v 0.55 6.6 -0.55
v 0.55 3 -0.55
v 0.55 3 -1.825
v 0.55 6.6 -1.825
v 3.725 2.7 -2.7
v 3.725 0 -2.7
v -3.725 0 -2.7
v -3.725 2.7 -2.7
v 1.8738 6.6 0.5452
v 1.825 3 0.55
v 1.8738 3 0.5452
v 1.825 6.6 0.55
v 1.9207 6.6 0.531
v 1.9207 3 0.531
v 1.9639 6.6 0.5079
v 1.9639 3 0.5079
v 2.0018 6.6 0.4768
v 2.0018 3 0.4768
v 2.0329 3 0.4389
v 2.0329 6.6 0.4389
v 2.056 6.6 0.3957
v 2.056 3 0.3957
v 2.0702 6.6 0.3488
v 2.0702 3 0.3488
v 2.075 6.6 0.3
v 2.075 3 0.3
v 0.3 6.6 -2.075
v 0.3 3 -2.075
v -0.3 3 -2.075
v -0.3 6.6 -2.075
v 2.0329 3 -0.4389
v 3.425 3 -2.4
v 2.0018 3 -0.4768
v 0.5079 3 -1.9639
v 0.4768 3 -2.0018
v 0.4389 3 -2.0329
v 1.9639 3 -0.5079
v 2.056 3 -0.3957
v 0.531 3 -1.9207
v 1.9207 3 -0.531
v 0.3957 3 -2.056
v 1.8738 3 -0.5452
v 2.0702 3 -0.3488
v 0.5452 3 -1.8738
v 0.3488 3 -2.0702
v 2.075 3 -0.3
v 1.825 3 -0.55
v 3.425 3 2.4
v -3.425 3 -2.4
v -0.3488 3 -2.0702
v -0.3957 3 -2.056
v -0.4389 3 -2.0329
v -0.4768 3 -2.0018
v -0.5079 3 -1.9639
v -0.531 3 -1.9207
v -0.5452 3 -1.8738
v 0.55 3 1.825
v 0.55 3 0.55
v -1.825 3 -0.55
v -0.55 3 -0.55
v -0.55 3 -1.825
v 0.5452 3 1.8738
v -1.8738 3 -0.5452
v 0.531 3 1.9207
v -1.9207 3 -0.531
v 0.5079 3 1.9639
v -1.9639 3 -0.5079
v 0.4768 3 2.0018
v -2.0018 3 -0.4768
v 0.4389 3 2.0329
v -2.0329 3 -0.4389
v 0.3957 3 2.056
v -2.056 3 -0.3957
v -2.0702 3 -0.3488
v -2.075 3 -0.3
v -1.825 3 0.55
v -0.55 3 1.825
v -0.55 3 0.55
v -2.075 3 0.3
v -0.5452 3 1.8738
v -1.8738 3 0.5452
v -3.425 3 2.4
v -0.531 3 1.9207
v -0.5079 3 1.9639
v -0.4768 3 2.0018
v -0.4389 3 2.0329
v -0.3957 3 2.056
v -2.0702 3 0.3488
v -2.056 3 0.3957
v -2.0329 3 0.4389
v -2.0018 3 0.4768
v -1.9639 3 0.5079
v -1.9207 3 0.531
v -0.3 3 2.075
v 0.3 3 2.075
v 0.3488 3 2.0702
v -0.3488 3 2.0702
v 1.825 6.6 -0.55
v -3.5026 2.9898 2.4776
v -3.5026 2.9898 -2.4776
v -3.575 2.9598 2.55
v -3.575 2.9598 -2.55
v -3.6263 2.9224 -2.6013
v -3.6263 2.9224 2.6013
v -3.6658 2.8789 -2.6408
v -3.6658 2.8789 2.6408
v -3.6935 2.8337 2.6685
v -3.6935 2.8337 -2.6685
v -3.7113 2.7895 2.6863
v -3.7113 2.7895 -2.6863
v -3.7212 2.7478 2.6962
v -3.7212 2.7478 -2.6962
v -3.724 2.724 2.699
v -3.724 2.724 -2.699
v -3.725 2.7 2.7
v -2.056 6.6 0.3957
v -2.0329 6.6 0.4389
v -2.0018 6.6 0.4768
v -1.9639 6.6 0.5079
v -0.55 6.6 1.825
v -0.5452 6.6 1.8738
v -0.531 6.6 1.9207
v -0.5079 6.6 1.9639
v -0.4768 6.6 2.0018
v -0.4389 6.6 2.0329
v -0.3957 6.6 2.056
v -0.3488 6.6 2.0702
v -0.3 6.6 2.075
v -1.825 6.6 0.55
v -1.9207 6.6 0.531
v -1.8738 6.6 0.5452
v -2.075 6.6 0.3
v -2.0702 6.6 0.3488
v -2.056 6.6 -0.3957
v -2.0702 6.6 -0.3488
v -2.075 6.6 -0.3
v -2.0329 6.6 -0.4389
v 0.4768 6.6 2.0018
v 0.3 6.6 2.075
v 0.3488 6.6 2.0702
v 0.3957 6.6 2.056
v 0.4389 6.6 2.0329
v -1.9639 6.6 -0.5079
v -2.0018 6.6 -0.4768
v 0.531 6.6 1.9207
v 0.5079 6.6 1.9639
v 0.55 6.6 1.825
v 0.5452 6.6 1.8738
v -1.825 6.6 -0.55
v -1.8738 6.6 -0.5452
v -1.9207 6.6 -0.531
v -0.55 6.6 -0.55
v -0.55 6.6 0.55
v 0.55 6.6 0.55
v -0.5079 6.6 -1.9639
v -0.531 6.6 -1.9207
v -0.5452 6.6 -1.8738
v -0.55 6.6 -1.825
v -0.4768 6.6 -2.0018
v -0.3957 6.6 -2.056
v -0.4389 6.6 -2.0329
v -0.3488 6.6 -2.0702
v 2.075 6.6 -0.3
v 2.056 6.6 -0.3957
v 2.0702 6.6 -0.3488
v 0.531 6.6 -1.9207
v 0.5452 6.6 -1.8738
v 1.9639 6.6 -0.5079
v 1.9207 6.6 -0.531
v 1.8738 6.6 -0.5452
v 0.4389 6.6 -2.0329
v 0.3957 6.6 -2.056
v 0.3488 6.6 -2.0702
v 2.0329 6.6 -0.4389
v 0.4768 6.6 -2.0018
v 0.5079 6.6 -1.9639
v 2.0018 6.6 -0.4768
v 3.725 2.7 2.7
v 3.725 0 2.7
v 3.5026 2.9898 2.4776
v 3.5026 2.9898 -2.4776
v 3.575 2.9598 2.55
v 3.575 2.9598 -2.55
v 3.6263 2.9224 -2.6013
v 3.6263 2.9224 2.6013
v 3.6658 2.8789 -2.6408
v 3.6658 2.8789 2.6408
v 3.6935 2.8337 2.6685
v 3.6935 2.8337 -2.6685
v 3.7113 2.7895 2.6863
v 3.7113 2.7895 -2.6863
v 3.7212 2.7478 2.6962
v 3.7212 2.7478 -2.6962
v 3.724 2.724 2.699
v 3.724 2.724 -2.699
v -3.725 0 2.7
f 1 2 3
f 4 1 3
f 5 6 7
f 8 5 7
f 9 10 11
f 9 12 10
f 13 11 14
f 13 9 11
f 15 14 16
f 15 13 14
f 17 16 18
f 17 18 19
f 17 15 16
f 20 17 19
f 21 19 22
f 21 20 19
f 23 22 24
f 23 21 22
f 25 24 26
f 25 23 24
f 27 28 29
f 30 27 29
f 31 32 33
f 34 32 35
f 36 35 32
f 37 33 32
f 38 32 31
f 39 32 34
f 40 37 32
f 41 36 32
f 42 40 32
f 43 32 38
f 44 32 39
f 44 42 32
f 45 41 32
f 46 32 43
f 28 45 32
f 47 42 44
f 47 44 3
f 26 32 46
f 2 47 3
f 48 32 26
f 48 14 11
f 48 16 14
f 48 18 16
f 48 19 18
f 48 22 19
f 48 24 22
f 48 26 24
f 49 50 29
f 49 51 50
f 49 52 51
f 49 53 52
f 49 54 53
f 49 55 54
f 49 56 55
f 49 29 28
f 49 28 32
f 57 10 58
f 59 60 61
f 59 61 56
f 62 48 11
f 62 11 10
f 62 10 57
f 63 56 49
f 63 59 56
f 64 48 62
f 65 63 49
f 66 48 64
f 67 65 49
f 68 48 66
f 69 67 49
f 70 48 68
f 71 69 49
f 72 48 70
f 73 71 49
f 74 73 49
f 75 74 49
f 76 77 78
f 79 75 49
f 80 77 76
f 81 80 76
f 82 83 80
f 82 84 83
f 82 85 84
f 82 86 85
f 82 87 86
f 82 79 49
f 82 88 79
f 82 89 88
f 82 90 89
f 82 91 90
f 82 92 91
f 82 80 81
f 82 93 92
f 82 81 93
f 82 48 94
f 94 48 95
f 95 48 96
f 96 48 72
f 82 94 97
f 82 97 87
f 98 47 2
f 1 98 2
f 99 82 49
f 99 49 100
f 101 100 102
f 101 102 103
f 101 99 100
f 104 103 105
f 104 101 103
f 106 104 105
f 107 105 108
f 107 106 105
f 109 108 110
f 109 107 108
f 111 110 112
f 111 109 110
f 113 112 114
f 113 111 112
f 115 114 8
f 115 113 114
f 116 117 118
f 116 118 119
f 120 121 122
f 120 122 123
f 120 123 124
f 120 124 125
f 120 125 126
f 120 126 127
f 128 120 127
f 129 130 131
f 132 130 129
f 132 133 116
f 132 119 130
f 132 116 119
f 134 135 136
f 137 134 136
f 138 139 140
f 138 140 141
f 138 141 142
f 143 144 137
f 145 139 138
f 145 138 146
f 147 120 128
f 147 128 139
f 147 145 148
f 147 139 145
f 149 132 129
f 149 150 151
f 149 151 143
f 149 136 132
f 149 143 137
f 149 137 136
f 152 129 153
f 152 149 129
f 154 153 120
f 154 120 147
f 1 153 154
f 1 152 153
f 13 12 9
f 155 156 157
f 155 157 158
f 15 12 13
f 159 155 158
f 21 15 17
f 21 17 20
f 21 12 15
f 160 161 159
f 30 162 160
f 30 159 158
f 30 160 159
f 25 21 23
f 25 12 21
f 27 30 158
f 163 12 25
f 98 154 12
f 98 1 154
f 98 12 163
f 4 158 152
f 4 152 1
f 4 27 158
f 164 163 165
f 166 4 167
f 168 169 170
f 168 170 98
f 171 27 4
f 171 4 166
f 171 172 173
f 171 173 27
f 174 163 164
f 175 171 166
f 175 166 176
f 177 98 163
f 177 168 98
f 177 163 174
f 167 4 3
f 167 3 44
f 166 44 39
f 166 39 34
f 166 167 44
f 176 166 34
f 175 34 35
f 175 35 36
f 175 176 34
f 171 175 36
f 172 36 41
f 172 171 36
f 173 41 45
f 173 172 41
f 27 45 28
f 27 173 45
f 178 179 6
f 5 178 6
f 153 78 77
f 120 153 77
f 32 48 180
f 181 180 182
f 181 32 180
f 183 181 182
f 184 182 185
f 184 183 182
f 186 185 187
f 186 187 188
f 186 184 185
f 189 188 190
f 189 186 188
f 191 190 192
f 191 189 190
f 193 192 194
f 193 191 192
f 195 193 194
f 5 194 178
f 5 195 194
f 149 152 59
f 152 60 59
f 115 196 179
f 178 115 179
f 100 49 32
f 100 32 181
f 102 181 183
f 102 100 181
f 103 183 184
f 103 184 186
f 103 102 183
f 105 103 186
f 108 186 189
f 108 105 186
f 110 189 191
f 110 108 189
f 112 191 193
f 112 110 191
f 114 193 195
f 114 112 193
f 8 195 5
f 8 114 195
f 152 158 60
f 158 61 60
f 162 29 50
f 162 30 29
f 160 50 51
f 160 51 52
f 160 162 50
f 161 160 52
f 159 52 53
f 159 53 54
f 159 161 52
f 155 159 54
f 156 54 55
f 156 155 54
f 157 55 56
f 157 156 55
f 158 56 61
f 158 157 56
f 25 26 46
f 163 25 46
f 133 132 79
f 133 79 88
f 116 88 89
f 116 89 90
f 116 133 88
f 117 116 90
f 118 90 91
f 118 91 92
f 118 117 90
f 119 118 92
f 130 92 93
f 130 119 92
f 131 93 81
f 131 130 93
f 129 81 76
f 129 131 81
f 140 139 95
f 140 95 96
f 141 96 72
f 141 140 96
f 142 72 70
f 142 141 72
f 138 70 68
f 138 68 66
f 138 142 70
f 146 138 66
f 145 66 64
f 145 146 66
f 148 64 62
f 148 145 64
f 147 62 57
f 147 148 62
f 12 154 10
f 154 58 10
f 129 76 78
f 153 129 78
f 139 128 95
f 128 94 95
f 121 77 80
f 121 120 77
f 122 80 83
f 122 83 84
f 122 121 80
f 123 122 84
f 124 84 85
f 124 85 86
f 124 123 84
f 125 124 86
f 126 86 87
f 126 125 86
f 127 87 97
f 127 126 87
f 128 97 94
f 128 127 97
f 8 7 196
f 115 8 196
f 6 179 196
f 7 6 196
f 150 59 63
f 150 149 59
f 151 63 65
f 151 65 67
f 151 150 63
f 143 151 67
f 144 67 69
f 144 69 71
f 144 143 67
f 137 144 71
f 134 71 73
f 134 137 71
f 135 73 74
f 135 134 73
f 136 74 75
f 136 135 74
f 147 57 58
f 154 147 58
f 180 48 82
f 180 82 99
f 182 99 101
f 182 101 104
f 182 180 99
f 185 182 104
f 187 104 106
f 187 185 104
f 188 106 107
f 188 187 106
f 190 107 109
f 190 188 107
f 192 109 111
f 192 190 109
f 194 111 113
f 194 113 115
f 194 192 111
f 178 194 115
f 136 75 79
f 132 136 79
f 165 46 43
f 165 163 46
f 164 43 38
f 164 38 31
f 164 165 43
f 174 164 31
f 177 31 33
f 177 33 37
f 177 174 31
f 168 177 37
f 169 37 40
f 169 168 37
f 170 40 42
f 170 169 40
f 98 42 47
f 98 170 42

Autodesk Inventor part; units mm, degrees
ref_plane "YZ Plane" through (0, 0, 0) normal (1, 0, 0) x (0, 1, 0)
ref_plane "XZ Plane" through (0, 0, 0) normal (0, 1, 0) x (-1, 0, 0)
ref_plane "XY Plane" through (0, 0, 0) normal (0, 0, 1) x (1, 0, 0)
sketch "Pole Base Profile" plane through (0, 0, 0) normal (0, 1, 0) x (-1, 0, 0)
  line L0 (3.725, 2.7) -> (-3.725, 2.7)
  line L1 (-3.725, 2.7) -> (-3.725, -2.7)
  line L2 (-3.725, -2.7) -> (3.725, -2.7)
  line L3 (3.725, -2.7) -> (3.725, 2.7)
  line L4 (3.725, 2.7) -> (-3.725, -2.7) construction
  line L5 (-3.725, 2.7) -> (3.725, -2.7) construction
  point P0 (0, 0)
  dimension "d0" = 7.45
  dimension "d1" = 5.4
extrude "Pole Base" add sketch "Pole Base Profile" along normal blind 3
sketch "Cross Base" plane through (0, 3, 0) normal (0, 1, 0) x (1, 0, 0)
  line L0 (-0.55, -2.075) -> (0.55, -2.075)
  line L1 (0.55, -2.075) -> (0.55, 2.075)
  line L2 (0.55, 2.075) -> (-0.55, 2.075)
  line L3 (-0.55, 2.075) -> (-0.55, -2.075)
  line L4 (-0.55, -2.075) -> (0.55, 2.075) construction
  line L5 (0.55, -2.075) -> (-0.55, 2.075) construction
  line L6 (-2.075, -0.55) -> (2.075, -0.55)
  line L7 (2.075, -0.55) -> (2.075, 0.55)
  line L8 (2.075, 0.55) -> (-2.075, 0.55)
  line L9 (-2.075, 0.55) -> (-2.075, -0.55)
  line L10 (-2.075, -0.55) -> (2.075, 0.55) construction
  line L11 (2.075, -0.55) -> (-2.075, 0.55) construction
  point P0 (0, 0)
  dimension "d12" = 1.1
  dimension "d13" = 4.15
  dimension "d14" = 4.15
  dimension "d15" = 1.1
extrude "Pole" add sketch "Cross Base" along normal blind 3.6
fillet "Pole Rounding" radius 0.25 8 edges at (2.075, 4.8, 0.55) (0.55, 4.8, 2.075) (-0.55, 4.8, 2.075) (-2.075, 4.8, 0.55) (-2.075, 4.8, -0.55) (-0.55, 4.8, -2.075) (0.55, 4.8, -2.075) (2.075, 4.8, -0.55)
fillet "Base Rounding" radius 0.3 4 edges at (-3.725, 3, 0) (0, 3, -2.7) (0, 3, 2.7) (3.725, 3, 0)
sketch "Top Center Point" plane through (0, 6.6, 0) normal (0, 1, 0) x (1, 0, 0)
  point P0 (0, 0)
equation "\"d0\" = s_polebl"
equation "\"d1\" = s_polebw"
equation "\"d12\" = k_cmxw"
equation "\"d13\" = k_cmxl"
equation "\"d14\" = d13"
equation "\"d15\" = d12"
equation "\"d8\" = s_poleh"
equation "\"k_width\" = 18"
equation "\"k_height\" = 16.5"
equation "\"k_taper1\" = 1.5"
equation "\"k_taper2\" = 0.5"
equation "\"k_radius\" = 6"
equation "\"k_wthick\" = 1.5"
equation "\"k_ribthick\" = 1.5"
equation "\"k_ribheight\" = 5"
equation "\"k_poleoff\" = 2.25"
equation "\"k_poledia\" = 5.3"
equation "\"k_cmxw\" = 1.1"
equation "\"k_cmxl\" = 4.15"
equation "\"s_bwidth\" = 14.4"
equation "\"s_poleh\" = 3.6"
equation "\"s_polebw\" = 5.4"
equation "\"s_polebl\" = 7.45"
equation "\"b_rshift\" = 49.5"
equation "\"b_height\" = 77"
equation "\"b_tab\" = 27"
equation "\"b_lshift\" = 40.5"
equation "\"b_space\" = 117"
equation "\"b_caps\" = 31.5"
equation "\"b_pad\" = 1"
equation "\"b_width\" = 285"
equation "\"b_ctrl\" = 22.5"
equation "\"k_staper\" = 1"
equation "\"k_ltaper\" = 1.5"
equation "\"k_sradius\" = 4"
equation "\"k_lradius\" = 6"
equation "\"k_height_t\" = 16"
equation "\"k_height_low\" = 15"
equation "\"k_taper_wide\" = 1.5"
equation "\"k_taper_thin\" = 0.0001"
equation "\"k_shortening\" = 4.5"
equation "\"k_cmxd\" = 4"
equation "\"k_taper_side\" = 0.5"
properties part number "keyswitch-pole_cherrymx"
